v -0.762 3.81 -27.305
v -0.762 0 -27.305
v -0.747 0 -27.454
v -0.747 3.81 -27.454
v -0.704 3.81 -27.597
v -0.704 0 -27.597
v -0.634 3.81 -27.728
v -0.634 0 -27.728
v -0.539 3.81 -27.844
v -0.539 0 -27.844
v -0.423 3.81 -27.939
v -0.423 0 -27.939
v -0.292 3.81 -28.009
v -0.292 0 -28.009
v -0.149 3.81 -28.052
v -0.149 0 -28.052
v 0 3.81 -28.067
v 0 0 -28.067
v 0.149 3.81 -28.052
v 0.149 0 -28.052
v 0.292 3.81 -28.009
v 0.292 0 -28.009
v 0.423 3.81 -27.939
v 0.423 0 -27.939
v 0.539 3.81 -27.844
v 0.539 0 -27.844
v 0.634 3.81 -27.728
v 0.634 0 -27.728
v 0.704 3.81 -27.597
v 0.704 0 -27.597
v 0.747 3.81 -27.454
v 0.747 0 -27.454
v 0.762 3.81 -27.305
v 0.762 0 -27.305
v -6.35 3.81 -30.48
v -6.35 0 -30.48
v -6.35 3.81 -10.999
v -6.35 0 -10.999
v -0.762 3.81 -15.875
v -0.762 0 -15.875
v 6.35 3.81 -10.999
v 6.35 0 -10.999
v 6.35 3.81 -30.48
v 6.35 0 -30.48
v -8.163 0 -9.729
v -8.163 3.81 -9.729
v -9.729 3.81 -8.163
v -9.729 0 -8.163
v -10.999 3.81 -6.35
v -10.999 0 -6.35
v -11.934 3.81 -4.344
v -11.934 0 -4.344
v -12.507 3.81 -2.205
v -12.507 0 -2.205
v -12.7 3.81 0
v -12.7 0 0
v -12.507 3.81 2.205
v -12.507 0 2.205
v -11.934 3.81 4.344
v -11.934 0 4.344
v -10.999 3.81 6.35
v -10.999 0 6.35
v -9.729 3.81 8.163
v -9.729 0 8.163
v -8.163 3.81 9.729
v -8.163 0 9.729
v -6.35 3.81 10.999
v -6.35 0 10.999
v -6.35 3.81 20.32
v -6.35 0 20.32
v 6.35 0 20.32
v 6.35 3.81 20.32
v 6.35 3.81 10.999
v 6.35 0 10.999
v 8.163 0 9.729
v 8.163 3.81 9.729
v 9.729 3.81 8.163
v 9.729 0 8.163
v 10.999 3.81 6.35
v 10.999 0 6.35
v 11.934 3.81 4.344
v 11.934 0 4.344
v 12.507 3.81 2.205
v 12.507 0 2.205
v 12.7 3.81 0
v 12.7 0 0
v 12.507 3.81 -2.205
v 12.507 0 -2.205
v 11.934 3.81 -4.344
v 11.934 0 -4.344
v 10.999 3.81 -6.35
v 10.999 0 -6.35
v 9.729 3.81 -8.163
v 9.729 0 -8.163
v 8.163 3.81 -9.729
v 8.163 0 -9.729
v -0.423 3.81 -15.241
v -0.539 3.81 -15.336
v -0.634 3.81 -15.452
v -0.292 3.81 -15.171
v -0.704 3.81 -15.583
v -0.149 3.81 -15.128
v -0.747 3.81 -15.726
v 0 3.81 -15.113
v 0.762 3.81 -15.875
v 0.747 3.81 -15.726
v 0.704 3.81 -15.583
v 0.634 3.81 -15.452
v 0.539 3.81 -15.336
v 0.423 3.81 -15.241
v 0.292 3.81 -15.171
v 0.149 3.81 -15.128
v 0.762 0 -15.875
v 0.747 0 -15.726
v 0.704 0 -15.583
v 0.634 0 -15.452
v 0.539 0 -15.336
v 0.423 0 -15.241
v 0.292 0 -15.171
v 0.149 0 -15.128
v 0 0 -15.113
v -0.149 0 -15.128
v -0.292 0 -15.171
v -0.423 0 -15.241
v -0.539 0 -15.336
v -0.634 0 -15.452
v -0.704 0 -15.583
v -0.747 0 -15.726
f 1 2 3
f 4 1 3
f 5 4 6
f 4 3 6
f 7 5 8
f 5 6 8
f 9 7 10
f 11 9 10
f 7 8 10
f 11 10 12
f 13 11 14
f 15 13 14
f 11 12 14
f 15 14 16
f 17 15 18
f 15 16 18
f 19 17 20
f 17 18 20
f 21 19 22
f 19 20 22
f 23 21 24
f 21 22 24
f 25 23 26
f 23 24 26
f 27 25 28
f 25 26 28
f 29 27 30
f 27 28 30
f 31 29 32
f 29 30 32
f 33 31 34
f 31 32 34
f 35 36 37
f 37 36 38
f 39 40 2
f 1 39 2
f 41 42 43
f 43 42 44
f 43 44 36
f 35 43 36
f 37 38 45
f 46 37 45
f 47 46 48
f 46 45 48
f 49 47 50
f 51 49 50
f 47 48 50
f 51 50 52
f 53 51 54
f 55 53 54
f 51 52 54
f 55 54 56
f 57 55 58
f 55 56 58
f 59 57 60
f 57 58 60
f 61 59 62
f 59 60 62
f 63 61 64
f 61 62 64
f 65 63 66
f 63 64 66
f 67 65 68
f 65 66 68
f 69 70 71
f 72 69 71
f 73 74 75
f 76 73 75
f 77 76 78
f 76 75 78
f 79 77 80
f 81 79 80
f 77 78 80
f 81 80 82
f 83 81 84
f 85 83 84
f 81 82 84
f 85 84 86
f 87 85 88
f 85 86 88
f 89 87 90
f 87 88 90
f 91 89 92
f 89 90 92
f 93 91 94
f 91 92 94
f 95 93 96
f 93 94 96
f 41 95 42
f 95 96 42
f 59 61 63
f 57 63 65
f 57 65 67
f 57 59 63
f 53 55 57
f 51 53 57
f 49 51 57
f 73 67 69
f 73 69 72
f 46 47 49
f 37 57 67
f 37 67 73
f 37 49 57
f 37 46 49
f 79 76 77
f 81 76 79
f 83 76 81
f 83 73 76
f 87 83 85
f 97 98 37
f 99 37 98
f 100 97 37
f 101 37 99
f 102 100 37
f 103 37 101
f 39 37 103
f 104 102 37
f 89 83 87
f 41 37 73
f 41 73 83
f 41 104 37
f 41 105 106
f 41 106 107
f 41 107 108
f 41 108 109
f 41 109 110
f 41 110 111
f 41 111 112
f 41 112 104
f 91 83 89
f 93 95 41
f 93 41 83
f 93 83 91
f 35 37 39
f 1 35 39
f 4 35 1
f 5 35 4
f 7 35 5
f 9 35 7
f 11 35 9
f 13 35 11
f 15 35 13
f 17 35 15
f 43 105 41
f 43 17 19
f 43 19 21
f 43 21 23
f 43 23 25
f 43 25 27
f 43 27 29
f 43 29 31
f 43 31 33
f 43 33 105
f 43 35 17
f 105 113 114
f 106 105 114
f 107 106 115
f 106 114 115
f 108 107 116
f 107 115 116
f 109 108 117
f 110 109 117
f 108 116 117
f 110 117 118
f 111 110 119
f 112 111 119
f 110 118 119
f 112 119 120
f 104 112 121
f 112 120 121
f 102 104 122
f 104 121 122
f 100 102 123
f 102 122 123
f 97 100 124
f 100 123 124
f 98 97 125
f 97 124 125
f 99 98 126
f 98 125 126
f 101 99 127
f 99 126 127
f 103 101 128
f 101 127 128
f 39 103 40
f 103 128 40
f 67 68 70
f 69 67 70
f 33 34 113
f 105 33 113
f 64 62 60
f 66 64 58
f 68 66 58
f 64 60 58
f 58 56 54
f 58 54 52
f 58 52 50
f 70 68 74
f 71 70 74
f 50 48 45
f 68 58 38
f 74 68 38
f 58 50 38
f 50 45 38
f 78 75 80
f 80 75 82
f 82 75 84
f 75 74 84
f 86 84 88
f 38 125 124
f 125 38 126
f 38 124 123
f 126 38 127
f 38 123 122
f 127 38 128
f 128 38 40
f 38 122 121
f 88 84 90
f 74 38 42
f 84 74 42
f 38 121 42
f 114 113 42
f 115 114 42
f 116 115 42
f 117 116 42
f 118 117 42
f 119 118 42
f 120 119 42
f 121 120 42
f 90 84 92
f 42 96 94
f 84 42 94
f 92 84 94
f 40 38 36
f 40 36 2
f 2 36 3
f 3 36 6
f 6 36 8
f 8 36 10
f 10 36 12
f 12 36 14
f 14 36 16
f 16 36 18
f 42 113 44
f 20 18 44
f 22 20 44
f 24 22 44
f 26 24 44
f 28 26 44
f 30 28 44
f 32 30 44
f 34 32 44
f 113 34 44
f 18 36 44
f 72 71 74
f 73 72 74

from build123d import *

# Parameters (mm, degrees)
BOSS_EXTRUDE1_DEPTH = 3.81


with BuildPart() as part:
    # Sketch2 → Boss-Extrude1 (new body)
    with BuildSketch(Plane(origin=(0, 0, 0), x_dir=(1, 0, 0), z_dir=(0, 1, 0))):
        with BuildLine():
            Line((6.35, 10.998522628), (6.35, 30.48))
            Line((6.35, 30.48), (-6.35, 30.48))
            Line((-6.35, 30.48), (-6.35, 10.998522628))
            ThreePointArc((-6.35, 10.998522628), (-12.7, 0), (-6.35, -10.998522628))
            Line((-6.35, -10.998522628), (-6.35, -20.32))
            Line((-6.35, -20.32), (6.35, -20.32))
            Line((6.35, -20.32), (6.35, -10.998522628))
            ThreePointArc((6.35, -10.998522628), (12.7, 0), (6.35, 10.998522628))
        make_face()
        with BuildLine():
            Line((-0.762, 15.875), (-0.762, 27.305))
            ThreePointArc((-0.762, 27.305), (0, 28.067), (0.762, 27.305))
            Line((0.762, 27.305), (0.762, 15.875))
            ThreePointArc((0.762, 15.875), (0, 15.113), (-0.762, 15.875))
        make_face(mode=Mode.SUBTRACT)
    extrude(amount=BOSS_EXTRUDE1_DEPTH)


solid = part.part
